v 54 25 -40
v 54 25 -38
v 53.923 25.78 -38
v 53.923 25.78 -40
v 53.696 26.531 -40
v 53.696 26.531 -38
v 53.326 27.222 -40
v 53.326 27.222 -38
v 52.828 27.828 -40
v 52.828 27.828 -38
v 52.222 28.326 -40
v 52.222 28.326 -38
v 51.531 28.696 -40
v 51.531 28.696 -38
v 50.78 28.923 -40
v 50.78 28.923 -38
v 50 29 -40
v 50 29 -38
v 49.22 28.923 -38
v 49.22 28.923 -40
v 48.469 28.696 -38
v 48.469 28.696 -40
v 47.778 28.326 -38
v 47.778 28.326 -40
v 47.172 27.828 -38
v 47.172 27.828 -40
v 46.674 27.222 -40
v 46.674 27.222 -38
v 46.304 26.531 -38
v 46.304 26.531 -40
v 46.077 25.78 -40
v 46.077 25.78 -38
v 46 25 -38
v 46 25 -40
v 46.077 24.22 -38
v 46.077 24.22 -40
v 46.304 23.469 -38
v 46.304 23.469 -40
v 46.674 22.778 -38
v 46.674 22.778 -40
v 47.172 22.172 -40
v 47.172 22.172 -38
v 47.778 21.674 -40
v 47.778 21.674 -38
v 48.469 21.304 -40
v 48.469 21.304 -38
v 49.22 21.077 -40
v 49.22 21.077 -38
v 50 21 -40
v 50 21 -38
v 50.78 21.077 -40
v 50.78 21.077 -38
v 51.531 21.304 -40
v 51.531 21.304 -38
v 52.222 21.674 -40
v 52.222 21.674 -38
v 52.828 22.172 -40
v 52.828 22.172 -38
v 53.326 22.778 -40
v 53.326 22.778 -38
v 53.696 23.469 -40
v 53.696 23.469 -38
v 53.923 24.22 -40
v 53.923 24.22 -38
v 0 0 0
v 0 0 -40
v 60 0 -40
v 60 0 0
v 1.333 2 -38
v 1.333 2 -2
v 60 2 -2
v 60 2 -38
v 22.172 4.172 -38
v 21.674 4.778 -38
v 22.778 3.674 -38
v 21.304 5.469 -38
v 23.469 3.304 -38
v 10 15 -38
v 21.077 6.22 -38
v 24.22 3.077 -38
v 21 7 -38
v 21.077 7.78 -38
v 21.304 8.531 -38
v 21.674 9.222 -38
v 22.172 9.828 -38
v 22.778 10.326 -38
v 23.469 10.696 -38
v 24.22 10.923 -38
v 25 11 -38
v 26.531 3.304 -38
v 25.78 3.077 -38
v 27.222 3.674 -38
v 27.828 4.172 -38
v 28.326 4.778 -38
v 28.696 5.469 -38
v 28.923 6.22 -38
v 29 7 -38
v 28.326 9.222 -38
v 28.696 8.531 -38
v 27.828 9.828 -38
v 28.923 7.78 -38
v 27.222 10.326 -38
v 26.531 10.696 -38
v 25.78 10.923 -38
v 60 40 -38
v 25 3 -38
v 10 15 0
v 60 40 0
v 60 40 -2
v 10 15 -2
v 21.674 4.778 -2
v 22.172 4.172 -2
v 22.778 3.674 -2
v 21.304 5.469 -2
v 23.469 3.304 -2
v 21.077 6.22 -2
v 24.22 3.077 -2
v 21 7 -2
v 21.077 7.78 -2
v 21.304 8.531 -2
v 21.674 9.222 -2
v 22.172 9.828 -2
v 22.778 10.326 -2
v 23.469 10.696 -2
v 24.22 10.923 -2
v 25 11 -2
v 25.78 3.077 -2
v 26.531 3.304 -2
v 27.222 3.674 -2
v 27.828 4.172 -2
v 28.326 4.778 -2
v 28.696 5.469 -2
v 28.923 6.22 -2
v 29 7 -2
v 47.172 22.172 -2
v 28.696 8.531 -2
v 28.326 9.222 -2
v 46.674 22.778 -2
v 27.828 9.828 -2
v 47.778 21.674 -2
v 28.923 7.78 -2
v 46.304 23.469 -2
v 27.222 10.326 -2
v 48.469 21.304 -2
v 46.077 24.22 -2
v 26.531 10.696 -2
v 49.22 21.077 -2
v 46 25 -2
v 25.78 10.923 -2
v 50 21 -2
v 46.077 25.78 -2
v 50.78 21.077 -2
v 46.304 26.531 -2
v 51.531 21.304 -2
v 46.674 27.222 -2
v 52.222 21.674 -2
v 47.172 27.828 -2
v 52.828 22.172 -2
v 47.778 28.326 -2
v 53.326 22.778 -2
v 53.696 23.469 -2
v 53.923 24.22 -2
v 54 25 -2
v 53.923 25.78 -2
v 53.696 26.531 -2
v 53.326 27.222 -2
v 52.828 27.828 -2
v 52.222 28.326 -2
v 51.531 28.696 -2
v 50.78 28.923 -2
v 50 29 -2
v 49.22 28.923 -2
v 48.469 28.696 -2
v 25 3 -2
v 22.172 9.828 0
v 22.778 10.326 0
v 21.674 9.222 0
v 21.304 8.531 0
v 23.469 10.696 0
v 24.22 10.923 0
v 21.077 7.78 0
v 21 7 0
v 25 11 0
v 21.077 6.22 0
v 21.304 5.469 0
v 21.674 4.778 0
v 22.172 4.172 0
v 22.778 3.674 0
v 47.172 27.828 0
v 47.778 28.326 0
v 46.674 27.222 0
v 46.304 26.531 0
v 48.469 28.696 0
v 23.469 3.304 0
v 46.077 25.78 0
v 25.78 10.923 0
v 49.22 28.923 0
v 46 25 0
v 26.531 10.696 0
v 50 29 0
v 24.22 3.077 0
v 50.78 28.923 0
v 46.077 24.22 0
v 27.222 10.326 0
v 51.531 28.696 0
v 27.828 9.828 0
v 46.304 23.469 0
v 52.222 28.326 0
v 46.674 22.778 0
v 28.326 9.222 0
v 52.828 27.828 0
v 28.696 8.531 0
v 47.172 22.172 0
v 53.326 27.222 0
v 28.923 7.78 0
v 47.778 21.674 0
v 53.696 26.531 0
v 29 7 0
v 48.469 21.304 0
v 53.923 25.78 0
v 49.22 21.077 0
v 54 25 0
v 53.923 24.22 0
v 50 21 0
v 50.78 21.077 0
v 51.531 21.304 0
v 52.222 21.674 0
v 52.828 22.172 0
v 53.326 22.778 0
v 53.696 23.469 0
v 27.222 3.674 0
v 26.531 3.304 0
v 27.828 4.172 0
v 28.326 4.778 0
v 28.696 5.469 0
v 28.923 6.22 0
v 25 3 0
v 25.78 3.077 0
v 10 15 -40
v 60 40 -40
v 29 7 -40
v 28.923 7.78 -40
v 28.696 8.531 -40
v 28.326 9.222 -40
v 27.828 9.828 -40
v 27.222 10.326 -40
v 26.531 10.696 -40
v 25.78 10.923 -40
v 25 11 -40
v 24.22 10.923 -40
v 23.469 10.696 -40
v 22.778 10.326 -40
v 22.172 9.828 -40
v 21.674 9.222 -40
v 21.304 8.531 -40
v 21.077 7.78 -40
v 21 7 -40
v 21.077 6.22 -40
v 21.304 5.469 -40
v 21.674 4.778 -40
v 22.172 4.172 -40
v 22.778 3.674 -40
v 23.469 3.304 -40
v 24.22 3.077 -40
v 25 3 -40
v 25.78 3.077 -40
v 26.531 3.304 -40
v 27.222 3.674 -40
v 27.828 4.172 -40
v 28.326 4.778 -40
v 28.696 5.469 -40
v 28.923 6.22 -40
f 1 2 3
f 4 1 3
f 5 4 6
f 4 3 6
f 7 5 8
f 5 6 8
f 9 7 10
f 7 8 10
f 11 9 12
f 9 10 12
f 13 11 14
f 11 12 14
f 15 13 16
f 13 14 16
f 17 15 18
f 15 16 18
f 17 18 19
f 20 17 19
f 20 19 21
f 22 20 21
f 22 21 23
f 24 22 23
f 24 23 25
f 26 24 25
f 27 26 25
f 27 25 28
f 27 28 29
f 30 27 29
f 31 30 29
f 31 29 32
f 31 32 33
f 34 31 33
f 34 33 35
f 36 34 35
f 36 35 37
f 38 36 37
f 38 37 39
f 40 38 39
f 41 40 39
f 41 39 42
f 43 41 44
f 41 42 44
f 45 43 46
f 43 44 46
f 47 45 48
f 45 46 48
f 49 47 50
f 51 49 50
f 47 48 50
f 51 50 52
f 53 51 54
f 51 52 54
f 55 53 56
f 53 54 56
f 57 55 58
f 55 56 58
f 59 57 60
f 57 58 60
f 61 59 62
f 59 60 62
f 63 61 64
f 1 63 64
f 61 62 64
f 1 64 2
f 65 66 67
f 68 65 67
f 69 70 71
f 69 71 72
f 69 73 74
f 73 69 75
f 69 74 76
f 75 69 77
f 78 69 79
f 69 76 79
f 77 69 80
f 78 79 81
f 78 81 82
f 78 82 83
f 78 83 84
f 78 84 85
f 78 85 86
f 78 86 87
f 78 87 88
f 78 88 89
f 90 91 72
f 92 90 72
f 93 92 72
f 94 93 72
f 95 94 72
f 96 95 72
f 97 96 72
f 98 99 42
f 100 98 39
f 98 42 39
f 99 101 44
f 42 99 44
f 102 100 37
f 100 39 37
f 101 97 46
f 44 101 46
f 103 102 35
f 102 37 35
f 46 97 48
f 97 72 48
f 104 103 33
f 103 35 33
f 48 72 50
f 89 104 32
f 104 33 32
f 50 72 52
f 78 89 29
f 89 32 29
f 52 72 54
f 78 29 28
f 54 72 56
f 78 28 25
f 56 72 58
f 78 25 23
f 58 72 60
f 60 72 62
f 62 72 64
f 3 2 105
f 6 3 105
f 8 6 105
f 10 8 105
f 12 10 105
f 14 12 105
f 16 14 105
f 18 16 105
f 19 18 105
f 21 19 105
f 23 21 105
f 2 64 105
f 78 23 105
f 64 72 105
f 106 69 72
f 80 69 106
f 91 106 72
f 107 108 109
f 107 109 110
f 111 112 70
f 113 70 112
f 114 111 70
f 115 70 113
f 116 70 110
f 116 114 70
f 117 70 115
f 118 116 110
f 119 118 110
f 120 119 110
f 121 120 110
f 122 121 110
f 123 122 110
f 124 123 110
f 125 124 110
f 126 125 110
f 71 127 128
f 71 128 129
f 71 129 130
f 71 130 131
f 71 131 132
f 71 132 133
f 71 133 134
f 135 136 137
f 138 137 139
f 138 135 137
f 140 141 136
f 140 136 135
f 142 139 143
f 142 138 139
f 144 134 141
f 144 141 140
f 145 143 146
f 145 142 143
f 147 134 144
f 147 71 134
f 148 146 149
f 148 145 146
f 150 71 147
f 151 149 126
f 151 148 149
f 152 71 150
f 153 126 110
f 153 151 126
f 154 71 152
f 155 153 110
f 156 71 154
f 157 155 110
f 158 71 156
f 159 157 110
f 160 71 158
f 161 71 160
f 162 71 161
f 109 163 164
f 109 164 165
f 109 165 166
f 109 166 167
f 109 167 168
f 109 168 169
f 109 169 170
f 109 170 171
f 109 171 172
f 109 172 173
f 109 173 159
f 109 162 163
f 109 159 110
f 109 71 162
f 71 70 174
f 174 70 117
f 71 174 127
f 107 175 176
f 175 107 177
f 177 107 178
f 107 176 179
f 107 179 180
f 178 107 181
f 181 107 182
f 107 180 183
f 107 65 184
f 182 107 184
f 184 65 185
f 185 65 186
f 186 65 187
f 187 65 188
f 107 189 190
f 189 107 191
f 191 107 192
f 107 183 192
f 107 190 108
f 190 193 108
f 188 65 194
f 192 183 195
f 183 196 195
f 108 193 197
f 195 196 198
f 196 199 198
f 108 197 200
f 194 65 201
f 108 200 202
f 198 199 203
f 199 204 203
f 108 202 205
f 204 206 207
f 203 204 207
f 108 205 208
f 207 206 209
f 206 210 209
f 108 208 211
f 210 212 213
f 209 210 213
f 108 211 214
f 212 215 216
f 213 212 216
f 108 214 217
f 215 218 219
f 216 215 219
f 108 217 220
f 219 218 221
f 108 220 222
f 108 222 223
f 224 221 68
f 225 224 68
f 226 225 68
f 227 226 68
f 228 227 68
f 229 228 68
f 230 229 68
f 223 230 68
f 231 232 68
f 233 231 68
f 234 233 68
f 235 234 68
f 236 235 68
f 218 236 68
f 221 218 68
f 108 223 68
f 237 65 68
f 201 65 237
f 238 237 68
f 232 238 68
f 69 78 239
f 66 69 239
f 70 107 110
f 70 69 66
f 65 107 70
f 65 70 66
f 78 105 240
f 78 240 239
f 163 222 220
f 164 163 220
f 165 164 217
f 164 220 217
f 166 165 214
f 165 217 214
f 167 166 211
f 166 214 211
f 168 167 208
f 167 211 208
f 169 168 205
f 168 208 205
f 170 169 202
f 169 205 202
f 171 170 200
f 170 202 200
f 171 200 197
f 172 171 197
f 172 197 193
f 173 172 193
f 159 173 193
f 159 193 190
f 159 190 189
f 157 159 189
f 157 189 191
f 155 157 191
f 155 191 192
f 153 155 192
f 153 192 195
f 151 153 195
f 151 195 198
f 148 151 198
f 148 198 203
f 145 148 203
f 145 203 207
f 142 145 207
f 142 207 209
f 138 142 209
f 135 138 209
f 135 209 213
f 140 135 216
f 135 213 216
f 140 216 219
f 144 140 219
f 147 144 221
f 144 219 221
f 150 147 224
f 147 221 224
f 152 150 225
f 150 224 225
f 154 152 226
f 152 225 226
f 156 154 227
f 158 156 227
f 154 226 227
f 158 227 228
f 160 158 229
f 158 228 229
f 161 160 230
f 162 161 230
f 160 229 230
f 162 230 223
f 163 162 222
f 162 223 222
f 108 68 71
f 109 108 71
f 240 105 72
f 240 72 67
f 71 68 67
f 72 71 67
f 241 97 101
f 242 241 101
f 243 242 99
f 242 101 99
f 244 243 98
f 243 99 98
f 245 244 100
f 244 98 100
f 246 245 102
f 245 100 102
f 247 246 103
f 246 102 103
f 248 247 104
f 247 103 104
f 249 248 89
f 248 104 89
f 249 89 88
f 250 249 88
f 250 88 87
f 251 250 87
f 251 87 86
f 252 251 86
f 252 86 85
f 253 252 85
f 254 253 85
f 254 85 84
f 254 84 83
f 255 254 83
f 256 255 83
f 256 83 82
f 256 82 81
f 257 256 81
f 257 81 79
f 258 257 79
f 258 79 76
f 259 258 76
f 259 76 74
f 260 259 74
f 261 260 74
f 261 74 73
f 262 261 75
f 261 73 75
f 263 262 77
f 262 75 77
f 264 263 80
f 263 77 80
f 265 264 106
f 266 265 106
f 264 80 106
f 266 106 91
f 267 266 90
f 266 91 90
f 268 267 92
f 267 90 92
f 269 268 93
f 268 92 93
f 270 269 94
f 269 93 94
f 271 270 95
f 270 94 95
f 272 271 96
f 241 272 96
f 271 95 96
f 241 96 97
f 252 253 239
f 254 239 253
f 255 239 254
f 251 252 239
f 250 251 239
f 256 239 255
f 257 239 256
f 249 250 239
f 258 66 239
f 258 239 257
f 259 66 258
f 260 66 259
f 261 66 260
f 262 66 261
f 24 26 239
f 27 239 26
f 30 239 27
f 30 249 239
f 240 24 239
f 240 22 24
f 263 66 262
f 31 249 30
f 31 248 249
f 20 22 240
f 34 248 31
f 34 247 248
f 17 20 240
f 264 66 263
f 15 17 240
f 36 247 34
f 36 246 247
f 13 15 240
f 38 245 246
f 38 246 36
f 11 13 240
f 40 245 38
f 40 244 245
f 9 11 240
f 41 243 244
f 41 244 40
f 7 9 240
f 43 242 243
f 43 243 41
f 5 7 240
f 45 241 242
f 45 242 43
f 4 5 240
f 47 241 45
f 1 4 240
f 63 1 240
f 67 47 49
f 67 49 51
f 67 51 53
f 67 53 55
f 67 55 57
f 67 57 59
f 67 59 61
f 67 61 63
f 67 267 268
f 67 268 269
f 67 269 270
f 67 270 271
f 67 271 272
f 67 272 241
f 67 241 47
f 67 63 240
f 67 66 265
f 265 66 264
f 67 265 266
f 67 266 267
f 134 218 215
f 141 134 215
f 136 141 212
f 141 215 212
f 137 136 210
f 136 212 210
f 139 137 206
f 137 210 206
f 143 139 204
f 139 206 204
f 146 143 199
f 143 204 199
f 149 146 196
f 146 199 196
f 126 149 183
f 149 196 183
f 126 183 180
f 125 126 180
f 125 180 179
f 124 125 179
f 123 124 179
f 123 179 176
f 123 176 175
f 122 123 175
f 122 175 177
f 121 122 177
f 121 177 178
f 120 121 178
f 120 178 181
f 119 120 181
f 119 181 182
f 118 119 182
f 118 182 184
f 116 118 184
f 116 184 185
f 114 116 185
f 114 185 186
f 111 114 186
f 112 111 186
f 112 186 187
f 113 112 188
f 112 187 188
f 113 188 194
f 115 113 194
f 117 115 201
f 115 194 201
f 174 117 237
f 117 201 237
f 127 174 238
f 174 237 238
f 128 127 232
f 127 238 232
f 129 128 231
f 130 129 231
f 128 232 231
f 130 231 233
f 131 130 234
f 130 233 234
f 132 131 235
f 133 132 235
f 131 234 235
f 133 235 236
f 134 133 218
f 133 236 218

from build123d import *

# Parameters (mm, degrees)
SKETCH1_W           = 60
SKETCH1_H           = 40
BOSS_EXTRUDE1_DEPTH = 40
SKETCH5_W           = 36
SKETCH5_H           = 38
CUT_EXTRUDE3_DEPTH  = 83.462112512
SKETCH6_R           = 4
CUT_EXTRUDE4_DEPTH  = 83.462112512


with BuildPart() as part:
    # Sketch1 → Boss-Extrude1 (new body)
    with BuildSketch(Plane(origin=(0, 0, 0), x_dir=(1, 0, 0), z_dir=(0, 1, 0))):
        with Locations((30, 20)):
            Rectangle(SKETCH1_W, SKETCH1_H)
    extrude(amount=BOSS_EXTRUDE1_DEPTH)

    # Sketch5 → Cut-Extrude3 (cut, through all)
    with BuildSketch(Plane(origin=(60, 0, 0), x_dir=(0, 0, -1), z_dir=(1, 0, 0))):
        with Locations((20, 21)):
            Rectangle(SKETCH5_W, SKETCH5_H)
    extrude(amount=-CUT_EXTRUDE3_DEPTH, mode=Mode.SUBTRACT)

    # Sketch6 → Cut-Extrude4 (cut, through all)
    with BuildSketch(Plane.XY):
        Polygon((10, 15), (0, 0), (0, 40), (60, 40), align=None)
        with Locations((25, 7)):
            Circle(SKETCH6_R)
        with Locations((50, 25)):
            Circle(SKETCH6_R)
    extrude(amount=-CUT_EXTRUDE4_DEPTH, mode=Mode.SUBTRACT)


solid = part.part
